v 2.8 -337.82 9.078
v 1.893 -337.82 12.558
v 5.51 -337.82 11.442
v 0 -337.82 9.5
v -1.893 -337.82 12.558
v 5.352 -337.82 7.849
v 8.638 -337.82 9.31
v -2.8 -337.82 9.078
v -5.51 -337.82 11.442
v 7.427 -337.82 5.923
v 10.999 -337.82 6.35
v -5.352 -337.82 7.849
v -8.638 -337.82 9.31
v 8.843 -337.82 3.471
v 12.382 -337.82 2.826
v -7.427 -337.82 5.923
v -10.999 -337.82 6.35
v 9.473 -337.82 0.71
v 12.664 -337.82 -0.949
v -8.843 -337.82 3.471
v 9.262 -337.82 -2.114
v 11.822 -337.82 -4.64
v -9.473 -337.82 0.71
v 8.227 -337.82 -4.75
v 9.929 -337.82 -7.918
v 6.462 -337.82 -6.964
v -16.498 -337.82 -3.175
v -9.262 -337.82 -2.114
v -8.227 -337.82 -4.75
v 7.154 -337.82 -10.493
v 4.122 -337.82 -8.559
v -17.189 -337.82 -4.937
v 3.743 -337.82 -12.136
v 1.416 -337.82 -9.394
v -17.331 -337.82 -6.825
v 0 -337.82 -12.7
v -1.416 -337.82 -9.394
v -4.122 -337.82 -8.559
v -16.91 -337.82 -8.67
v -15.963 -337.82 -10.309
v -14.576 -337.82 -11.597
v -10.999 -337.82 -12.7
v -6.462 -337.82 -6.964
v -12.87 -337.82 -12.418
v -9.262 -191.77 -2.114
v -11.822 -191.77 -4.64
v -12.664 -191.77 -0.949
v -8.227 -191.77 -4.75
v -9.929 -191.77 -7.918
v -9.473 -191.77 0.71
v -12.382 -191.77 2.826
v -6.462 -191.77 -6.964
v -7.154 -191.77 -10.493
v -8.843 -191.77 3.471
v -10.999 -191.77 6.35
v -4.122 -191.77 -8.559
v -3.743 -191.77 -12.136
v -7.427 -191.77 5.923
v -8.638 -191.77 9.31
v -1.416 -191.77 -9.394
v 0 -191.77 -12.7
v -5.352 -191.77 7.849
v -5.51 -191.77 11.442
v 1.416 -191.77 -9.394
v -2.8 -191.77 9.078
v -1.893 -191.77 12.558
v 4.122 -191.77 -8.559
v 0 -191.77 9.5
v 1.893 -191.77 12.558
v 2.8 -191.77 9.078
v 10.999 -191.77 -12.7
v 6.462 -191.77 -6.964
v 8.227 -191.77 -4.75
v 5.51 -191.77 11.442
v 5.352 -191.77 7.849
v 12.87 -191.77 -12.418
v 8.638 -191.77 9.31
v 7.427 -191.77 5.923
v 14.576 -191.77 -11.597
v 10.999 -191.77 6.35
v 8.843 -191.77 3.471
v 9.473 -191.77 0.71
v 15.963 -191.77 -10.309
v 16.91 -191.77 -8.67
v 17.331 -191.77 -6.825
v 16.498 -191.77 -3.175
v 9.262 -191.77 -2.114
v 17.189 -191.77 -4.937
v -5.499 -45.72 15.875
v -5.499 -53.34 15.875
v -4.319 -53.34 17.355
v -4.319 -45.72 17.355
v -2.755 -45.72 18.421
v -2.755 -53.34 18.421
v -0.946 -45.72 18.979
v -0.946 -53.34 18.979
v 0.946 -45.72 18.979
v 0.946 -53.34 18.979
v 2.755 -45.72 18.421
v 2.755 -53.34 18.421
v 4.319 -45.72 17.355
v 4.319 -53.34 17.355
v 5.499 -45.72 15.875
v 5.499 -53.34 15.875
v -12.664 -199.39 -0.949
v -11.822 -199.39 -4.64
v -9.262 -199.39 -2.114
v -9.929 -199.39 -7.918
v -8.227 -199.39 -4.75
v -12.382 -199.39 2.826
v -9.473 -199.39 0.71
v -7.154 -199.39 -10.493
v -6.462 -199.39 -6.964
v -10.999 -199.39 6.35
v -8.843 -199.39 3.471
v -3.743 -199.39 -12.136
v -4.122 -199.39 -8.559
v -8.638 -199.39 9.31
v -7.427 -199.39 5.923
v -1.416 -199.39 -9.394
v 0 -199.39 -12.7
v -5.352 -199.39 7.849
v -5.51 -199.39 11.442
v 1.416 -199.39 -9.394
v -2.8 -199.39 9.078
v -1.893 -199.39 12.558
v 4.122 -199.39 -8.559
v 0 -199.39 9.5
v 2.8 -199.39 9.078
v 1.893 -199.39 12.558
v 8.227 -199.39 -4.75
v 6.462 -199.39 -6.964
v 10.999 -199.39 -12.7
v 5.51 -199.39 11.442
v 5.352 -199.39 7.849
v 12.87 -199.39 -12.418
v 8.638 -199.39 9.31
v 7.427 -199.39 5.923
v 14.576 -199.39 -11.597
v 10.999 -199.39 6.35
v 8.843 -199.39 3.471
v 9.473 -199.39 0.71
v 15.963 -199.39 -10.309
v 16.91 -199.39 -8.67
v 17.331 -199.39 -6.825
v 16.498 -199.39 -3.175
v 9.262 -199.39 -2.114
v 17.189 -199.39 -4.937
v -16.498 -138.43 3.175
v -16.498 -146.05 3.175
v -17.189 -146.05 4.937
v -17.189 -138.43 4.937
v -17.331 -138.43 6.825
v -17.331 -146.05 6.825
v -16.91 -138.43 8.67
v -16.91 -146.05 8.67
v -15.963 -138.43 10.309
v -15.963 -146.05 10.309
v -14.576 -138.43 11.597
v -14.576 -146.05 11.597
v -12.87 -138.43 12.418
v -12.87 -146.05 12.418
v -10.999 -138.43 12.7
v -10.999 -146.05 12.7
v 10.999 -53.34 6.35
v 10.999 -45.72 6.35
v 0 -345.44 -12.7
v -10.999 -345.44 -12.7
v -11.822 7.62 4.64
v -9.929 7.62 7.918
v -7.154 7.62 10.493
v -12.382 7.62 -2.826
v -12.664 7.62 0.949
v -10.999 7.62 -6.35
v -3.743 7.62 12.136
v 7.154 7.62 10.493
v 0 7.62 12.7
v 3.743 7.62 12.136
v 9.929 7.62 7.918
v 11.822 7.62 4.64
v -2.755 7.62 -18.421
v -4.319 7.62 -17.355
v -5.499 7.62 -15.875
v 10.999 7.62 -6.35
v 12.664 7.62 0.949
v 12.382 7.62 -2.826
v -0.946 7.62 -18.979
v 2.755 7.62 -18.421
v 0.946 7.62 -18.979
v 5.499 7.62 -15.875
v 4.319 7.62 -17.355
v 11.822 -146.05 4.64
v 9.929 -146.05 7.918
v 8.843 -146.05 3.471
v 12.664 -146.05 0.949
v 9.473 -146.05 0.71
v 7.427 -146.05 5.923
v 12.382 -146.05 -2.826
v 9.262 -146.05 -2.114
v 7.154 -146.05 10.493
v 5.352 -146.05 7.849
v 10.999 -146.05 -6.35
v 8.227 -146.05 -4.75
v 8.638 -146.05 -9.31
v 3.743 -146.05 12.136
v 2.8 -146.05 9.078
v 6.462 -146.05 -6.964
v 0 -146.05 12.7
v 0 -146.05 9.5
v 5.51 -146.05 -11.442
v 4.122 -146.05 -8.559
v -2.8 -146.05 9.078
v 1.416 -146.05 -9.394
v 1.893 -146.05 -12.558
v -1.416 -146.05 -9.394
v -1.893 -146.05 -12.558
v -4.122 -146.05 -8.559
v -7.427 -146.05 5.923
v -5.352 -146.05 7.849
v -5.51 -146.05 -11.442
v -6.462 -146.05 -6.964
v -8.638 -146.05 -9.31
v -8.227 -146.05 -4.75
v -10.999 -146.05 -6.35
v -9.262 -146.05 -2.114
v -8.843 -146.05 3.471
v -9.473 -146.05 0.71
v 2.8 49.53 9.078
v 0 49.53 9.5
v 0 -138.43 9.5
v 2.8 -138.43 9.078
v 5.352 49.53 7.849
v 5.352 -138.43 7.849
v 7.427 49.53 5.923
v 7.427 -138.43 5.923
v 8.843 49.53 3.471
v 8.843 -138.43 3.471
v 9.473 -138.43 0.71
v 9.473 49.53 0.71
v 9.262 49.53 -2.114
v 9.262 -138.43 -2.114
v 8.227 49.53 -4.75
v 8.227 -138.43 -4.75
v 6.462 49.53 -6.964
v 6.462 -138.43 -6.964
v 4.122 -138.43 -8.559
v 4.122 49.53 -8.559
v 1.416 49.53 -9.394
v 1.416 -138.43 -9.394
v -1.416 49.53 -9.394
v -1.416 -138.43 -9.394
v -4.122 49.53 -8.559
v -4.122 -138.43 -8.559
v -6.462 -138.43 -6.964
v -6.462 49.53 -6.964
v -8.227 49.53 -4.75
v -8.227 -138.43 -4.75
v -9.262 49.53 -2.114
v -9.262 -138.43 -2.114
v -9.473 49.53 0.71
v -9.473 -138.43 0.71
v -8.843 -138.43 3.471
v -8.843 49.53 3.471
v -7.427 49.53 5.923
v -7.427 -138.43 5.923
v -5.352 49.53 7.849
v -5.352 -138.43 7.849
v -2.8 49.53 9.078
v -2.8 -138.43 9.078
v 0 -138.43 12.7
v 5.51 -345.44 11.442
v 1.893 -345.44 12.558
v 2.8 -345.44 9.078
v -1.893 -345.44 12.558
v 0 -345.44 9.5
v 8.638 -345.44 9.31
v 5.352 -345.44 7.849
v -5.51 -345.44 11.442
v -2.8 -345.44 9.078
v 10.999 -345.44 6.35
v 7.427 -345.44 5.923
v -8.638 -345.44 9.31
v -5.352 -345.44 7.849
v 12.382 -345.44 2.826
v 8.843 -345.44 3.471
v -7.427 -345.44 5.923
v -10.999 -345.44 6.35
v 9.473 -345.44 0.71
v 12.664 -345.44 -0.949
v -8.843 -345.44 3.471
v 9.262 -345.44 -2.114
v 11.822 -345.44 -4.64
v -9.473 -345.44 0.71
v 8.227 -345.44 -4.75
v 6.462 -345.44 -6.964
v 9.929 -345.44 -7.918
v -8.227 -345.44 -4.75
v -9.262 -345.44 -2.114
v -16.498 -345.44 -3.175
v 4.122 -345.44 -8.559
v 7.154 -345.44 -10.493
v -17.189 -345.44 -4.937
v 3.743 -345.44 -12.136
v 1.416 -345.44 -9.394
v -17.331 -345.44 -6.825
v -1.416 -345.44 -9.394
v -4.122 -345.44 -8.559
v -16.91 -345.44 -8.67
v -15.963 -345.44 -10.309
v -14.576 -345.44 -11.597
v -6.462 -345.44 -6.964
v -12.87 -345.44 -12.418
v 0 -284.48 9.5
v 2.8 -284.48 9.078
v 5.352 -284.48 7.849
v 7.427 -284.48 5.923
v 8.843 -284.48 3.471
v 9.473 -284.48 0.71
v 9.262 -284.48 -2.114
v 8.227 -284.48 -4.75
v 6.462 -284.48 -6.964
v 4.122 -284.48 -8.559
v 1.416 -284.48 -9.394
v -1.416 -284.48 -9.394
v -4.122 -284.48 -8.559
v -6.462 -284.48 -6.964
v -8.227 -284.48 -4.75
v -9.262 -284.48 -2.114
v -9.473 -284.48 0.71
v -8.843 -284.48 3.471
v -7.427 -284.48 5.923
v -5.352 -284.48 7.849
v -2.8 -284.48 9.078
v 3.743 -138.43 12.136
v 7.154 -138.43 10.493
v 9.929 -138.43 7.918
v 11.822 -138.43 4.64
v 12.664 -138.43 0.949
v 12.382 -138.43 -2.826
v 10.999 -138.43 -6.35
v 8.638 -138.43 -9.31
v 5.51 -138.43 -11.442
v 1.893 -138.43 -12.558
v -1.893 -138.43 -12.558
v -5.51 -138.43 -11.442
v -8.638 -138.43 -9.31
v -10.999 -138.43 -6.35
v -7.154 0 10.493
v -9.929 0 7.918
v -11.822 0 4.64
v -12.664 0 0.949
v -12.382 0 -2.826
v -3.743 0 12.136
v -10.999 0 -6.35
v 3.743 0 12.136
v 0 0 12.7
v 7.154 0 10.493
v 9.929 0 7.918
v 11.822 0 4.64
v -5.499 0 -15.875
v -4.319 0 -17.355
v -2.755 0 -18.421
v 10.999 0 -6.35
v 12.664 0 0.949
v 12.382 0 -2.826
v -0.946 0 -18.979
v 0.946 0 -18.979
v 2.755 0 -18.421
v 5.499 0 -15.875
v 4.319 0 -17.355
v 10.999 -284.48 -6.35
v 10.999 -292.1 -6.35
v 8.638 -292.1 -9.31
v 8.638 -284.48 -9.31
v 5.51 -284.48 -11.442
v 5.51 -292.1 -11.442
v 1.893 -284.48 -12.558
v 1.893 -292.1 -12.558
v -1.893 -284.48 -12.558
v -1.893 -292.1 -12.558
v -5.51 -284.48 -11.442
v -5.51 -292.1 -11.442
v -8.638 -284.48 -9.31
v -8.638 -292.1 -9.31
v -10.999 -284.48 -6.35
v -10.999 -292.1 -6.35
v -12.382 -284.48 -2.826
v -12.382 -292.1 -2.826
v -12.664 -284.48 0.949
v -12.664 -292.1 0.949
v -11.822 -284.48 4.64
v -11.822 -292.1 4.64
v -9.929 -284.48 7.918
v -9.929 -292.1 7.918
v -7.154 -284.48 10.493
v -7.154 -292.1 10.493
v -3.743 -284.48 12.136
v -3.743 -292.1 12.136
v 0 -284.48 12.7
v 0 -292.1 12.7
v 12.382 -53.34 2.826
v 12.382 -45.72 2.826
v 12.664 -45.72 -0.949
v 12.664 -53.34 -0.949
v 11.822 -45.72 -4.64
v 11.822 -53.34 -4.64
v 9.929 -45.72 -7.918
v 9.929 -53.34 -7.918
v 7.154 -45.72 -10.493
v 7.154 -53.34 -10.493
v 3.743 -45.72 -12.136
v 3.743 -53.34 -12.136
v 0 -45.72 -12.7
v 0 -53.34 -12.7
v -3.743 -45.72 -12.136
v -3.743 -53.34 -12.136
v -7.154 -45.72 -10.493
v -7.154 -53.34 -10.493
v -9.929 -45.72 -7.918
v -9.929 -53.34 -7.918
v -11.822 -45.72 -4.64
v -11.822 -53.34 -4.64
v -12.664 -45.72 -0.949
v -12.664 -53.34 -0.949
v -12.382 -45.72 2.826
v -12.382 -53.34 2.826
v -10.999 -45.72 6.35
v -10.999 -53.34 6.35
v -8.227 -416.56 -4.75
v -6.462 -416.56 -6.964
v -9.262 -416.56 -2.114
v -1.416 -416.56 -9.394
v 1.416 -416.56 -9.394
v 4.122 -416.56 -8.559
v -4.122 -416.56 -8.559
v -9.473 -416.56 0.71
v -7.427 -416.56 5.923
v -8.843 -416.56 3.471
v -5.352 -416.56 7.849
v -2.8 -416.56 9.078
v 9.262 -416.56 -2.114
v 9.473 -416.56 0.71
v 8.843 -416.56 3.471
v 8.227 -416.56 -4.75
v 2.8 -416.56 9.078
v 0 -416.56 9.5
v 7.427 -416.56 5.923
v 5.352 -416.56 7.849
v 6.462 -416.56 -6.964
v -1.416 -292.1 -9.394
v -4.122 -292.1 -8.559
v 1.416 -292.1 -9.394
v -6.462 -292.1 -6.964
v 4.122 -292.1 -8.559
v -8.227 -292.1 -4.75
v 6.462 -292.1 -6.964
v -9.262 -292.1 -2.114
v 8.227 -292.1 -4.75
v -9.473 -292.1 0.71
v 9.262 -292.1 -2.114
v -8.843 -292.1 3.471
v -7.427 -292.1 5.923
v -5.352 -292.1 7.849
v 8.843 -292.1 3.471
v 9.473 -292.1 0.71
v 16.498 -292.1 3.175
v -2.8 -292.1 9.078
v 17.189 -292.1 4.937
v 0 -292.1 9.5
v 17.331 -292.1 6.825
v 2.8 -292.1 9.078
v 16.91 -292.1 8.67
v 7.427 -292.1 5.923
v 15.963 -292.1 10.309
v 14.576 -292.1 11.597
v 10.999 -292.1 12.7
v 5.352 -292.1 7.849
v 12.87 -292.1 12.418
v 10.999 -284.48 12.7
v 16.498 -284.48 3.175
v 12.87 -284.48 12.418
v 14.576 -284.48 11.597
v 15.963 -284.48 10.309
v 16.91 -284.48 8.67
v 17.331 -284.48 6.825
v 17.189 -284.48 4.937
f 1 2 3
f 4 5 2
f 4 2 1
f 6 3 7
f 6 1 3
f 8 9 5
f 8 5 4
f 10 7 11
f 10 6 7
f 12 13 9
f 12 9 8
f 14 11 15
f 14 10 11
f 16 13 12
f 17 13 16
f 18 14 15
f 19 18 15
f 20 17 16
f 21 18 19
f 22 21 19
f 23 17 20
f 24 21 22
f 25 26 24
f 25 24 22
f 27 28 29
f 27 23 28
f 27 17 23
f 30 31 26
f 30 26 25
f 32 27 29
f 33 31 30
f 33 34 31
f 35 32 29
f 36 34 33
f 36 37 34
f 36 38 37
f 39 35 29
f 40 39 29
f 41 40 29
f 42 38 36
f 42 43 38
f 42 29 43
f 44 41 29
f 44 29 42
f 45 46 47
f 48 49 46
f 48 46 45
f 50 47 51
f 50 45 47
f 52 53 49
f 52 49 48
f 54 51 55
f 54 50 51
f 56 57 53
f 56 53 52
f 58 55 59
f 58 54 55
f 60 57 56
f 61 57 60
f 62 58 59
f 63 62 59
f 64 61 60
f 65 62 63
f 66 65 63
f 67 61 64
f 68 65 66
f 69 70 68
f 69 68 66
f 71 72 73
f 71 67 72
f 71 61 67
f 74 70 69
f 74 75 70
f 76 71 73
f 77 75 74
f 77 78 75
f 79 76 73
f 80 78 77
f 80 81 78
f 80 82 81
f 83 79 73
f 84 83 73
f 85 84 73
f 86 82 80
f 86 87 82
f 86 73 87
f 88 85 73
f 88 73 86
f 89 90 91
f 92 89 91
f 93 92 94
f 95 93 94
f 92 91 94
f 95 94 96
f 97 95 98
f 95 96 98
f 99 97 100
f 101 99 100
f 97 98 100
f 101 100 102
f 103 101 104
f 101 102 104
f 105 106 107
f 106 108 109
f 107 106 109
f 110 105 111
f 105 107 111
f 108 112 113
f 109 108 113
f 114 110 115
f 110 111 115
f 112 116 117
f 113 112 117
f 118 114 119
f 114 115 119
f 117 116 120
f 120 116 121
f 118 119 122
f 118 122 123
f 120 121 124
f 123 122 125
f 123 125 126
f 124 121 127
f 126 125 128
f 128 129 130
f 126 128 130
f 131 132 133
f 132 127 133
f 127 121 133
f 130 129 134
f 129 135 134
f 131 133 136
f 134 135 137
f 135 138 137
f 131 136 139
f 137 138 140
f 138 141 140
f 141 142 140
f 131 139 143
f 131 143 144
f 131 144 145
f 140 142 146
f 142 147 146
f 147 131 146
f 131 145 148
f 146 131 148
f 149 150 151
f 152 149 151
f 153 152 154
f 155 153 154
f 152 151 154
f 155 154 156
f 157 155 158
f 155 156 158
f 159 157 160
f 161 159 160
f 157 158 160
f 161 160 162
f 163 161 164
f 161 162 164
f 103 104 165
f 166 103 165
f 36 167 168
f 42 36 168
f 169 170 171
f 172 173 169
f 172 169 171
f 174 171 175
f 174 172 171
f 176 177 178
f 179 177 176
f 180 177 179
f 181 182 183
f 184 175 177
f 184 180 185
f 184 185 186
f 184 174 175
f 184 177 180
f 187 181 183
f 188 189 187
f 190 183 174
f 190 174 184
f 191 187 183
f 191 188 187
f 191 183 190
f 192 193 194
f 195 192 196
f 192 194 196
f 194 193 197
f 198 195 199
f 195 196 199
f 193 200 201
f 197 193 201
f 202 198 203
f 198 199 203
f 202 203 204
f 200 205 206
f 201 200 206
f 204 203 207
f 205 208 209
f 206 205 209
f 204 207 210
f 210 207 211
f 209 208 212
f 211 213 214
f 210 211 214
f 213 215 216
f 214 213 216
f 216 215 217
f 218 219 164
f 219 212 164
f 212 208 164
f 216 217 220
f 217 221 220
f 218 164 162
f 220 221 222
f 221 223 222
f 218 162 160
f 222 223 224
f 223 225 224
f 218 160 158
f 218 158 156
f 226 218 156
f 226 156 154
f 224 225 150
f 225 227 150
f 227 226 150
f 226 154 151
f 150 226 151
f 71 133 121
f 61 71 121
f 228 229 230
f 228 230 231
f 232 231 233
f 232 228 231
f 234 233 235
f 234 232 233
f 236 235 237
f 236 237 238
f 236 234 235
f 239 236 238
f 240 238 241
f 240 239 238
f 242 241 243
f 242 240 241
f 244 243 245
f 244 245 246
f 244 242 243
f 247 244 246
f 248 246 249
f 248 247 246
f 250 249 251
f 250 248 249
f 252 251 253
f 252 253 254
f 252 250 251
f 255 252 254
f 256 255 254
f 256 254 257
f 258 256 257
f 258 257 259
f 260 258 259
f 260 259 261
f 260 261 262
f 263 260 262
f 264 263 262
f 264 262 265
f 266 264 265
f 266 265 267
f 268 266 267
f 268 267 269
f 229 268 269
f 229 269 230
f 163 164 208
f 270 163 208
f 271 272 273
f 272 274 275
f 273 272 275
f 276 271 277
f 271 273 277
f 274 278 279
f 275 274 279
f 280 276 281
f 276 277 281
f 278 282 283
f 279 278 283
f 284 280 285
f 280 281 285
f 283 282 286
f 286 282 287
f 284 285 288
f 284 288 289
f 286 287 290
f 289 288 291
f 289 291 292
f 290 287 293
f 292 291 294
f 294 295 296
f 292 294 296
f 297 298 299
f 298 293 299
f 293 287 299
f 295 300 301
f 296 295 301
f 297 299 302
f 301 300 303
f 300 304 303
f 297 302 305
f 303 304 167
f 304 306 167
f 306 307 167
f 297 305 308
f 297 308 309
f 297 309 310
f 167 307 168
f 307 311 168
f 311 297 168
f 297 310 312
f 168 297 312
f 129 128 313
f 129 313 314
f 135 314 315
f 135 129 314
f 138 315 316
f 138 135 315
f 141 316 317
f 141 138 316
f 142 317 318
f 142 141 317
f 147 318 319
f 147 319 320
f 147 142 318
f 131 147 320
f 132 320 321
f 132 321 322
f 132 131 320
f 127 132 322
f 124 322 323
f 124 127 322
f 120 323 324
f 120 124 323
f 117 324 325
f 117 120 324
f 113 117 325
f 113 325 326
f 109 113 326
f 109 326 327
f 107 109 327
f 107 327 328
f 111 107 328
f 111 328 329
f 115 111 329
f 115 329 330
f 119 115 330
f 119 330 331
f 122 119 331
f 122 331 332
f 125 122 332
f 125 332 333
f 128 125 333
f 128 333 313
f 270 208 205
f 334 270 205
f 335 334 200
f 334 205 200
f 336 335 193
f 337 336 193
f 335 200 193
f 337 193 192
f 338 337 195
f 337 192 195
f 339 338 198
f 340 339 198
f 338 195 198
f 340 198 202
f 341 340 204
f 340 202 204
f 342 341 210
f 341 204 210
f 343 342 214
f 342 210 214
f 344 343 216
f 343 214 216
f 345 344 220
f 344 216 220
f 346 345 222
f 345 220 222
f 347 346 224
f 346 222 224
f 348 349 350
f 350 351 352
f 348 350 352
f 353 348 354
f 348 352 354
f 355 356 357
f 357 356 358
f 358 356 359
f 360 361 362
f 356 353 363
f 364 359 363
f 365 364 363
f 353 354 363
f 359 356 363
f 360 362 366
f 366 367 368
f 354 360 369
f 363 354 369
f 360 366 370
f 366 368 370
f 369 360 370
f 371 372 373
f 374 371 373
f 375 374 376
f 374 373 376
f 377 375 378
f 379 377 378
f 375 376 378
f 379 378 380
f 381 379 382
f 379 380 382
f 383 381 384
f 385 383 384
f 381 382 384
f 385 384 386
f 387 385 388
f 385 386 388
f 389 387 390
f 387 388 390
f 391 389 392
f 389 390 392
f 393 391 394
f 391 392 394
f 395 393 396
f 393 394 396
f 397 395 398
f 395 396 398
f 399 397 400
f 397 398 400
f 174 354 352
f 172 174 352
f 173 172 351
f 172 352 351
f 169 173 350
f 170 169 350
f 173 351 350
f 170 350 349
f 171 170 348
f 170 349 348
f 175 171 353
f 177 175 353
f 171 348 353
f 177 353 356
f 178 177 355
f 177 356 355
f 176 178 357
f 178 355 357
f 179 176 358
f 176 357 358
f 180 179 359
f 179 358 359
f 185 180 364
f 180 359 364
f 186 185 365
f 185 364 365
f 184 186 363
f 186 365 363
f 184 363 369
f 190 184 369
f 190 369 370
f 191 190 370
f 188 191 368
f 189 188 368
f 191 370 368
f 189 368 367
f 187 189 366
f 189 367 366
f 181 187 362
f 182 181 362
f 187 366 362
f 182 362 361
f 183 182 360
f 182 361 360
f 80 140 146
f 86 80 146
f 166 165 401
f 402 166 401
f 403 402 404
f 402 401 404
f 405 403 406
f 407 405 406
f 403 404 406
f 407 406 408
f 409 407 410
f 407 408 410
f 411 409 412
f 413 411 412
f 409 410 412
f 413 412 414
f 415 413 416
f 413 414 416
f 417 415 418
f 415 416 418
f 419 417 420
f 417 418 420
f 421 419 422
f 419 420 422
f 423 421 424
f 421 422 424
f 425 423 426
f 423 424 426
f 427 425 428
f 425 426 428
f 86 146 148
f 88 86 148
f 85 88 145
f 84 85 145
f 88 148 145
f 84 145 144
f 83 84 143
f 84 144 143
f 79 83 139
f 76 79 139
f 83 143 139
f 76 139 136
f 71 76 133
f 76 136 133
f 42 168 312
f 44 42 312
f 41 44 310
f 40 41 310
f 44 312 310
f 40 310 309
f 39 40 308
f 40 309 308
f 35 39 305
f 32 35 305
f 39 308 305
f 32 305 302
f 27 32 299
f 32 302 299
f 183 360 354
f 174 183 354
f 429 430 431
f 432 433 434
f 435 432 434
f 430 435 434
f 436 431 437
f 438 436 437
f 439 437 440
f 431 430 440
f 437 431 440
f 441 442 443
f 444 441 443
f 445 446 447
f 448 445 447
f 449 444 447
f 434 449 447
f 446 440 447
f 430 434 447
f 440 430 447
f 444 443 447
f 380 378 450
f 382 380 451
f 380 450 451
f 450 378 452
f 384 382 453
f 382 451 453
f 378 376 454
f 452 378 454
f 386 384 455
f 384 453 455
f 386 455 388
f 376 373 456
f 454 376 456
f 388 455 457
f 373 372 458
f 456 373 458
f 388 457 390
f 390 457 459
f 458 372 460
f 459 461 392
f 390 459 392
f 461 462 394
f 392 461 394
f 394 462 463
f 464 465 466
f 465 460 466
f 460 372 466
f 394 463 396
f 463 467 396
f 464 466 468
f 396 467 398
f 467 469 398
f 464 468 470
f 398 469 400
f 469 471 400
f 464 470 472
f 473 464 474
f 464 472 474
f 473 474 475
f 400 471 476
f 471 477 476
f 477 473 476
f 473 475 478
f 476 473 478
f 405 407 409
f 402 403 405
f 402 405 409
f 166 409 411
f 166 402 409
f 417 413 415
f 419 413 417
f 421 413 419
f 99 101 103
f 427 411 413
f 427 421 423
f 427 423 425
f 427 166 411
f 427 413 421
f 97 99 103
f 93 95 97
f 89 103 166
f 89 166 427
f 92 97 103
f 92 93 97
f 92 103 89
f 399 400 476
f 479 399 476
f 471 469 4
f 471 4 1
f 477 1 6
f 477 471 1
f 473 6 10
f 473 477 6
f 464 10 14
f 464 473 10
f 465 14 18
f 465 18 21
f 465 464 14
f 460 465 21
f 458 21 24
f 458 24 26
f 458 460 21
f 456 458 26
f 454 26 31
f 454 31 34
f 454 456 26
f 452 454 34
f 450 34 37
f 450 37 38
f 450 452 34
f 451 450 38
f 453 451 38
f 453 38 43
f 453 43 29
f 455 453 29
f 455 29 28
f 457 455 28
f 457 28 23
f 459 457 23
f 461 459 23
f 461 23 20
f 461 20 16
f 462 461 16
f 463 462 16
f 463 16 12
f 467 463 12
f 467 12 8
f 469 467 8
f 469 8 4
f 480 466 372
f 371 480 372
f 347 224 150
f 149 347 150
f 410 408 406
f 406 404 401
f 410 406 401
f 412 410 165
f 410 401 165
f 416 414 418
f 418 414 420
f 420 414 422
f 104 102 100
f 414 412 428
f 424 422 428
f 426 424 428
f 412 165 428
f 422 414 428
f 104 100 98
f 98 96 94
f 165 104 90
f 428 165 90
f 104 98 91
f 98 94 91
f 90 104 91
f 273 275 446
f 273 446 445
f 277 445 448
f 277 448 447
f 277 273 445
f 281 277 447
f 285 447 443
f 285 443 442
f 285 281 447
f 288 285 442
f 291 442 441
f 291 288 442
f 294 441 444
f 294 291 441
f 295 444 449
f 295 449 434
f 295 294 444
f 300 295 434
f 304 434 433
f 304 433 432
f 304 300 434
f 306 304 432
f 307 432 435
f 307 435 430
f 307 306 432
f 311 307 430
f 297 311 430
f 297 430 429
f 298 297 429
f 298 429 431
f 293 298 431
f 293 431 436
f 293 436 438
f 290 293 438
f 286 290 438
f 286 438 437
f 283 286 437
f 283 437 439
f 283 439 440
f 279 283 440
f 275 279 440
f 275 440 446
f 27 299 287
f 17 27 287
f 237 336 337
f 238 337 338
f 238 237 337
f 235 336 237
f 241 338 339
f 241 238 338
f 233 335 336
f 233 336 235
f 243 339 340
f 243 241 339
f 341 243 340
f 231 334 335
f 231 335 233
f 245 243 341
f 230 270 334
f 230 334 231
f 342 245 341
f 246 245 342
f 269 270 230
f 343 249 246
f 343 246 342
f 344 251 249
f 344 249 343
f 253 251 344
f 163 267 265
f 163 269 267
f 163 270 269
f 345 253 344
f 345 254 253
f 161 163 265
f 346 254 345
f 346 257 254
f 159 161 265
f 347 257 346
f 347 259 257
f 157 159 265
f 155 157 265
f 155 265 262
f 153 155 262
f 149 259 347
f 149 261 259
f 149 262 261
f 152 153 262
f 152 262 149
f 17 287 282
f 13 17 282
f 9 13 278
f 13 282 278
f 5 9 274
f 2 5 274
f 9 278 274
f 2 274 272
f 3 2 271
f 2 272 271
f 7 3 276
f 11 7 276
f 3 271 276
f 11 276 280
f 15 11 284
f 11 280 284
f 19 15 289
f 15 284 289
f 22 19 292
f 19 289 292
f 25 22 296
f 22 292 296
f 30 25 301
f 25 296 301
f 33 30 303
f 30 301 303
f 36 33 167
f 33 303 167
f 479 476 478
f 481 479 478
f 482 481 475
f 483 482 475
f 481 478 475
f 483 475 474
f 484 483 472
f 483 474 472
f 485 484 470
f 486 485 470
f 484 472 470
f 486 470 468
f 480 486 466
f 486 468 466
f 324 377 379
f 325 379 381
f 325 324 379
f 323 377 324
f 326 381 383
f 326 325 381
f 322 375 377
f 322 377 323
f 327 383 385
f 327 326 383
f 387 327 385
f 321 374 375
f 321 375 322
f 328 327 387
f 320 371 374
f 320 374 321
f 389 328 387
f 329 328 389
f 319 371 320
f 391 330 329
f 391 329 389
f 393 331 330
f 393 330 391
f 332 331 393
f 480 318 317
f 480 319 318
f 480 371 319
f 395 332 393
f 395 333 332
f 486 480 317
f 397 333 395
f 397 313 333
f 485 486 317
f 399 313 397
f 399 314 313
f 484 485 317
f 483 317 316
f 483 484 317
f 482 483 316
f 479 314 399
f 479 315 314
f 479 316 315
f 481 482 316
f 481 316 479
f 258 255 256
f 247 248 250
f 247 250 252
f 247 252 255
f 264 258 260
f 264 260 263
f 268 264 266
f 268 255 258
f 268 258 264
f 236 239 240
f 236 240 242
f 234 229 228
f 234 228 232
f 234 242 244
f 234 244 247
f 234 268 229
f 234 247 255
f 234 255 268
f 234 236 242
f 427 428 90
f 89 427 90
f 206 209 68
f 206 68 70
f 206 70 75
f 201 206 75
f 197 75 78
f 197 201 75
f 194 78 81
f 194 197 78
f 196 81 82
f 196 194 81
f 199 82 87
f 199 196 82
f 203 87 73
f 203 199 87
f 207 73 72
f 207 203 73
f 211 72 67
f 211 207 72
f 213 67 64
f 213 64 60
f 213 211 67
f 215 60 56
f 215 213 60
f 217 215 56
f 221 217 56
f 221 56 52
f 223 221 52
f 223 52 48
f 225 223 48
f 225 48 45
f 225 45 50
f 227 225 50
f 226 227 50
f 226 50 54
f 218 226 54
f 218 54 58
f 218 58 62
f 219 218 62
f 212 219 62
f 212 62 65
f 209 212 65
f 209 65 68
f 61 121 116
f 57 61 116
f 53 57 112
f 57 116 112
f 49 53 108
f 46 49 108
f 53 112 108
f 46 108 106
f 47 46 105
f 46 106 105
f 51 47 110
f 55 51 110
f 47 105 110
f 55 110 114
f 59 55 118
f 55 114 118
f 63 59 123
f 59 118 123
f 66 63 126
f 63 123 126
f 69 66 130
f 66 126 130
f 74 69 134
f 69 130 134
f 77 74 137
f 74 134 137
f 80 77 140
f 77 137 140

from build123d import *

# Parameters (mm, degrees)
BOSS_EXTRUDE1_DEPTH   = 7.62
LPATTERN1_COUNT       = 2
LPATTERN1_PITCH       = 53.34
BODY_MOVE_COPY1_ANGLE = 180
LPATTERN2_COUNT       = 3
LPATTERN2_PITCH       = 146.05
BODY_MOVE_COPY2_ANGLE = 120
BODY_MOVE_COPY3_ANGLE = 120
BOSS_EXTRUDE2_START   = 49.53
SKETCH2_R             = 9.5
BOSS_EXTRUDE2_DEPTH   = 466.09


with BuildPart() as part:
    # Sketch1 → Boss-Extrude1 (new body)
    with BuildSketch(Plane(origin=(0, 0, 0), x_dir=(1, 0, 0), z_dir=(0, 1, 0))):
        with BuildLine():
            Line((-5.499261314, 15.875), (-10.998522628, 6.35))
            ThreePointArc((-10.998522628, 6.35), (0, -12.7), (10.998522628, 6.35))
            Line((10.998522628, 6.35), (5.499261314, 15.875))
            ThreePointArc((5.499261314, 15.875), (0, 19.05), (-5.499261314, 15.875))
        make_face()
    extrude(amount=BOSS_EXTRUDE1_DEPTH)


with BuildPart() as lpattern1_1:
    # LPattern1: pattern copy
    add(part.part.moved(Location(Vector(0, -1, 0) * (1 * LPATTERN1_PITCH))))


with BuildPart() as lpattern1_1_1:
    # Body-Move/Copy1: moved
    add(lpattern1_1.part.rotate(Axis((0, 0, 0), (0, 1, 0)), BODY_MOVE_COPY1_ANGLE))


with BuildPart() as lpattern2_1:
    # LPattern2: pattern copy
    add(lpattern1_1_1.part.moved(Location(Vector(0, -1, 0) * (1 * LPATTERN2_PITCH))))


with BuildPart() as lpattern2_2:
    # LPattern2: pattern copy
    add(lpattern1_1_1.part.moved(Location(Vector(0, -1, 0) * (2 * LPATTERN2_PITCH))))


with BuildPart() as lpattern2_3:
    # LPattern2: pattern copy
    add(part.part.moved(Location(Vector(0, -1, 0) * (1 * LPATTERN2_PITCH))))


with BuildPart() as lpattern2_4:
    # LPattern2: pattern copy
    add(part.part.moved(Location(Vector(0, -1, 0) * (2 * LPATTERN2_PITCH))))


with BuildPart() as lpattern2_3_1:
    # Body-Move/Copy2: moved
    add(lpattern2_3.part.rotate(Axis((0, 0, 0), (0, 1, 0)), BODY_MOVE_COPY2_ANGLE))


with BuildPart() as lpattern2_1_1:
    # Body-Move/Copy2: moved
    add(lpattern2_1.part.rotate(Axis((0, 0, 0), (0, 1, 0)), BODY_MOVE_COPY2_ANGLE))



with BuildPart() as lpattern2_2_1:
    # Body-Move/Copy3: moved
    add(lpattern2_2.part.rotate(Axis((0, 0, 0), (0, -1, 0)), BODY_MOVE_COPY3_ANGLE))


with BuildPart() as lpattern2_4_1:
    # Body-Move/Copy3: moved
    add(lpattern2_4.part.rotate(Axis((0, 0, 0), (0, -1, 0)), BODY_MOVE_COPY3_ANGLE))


with BuildPart() as lpattern2_1_2:
    add(lpattern2_1_1.part)

    add(lpattern2_2_1.part)  # Boss-Extrude2 merges LPattern2_2

    add(lpattern2_3_1.part)  # Boss-Extrude2 merges LPattern2_3

    add(lpattern2_4_1.part)  # Boss-Extrude2 merges LPattern2_4
    # Sketch2 → Boss-Extrude2 (add)
    with BuildSketch(Plane(origin=(0, 0, 0), x_dir=(1, 0, 0), z_dir=(0, 1, 0)).offset(BOSS_EXTRUDE2_START)):
        with Locations(Location((0, 0, 0), (0, 0, 270))):
            Circle(SKETCH2_R)
    extrude(amount=-BOSS_EXTRUDE2_DEPTH)


solid = Compound([part.part, lpattern1_1_1.part, lpattern2_1_2.part])
